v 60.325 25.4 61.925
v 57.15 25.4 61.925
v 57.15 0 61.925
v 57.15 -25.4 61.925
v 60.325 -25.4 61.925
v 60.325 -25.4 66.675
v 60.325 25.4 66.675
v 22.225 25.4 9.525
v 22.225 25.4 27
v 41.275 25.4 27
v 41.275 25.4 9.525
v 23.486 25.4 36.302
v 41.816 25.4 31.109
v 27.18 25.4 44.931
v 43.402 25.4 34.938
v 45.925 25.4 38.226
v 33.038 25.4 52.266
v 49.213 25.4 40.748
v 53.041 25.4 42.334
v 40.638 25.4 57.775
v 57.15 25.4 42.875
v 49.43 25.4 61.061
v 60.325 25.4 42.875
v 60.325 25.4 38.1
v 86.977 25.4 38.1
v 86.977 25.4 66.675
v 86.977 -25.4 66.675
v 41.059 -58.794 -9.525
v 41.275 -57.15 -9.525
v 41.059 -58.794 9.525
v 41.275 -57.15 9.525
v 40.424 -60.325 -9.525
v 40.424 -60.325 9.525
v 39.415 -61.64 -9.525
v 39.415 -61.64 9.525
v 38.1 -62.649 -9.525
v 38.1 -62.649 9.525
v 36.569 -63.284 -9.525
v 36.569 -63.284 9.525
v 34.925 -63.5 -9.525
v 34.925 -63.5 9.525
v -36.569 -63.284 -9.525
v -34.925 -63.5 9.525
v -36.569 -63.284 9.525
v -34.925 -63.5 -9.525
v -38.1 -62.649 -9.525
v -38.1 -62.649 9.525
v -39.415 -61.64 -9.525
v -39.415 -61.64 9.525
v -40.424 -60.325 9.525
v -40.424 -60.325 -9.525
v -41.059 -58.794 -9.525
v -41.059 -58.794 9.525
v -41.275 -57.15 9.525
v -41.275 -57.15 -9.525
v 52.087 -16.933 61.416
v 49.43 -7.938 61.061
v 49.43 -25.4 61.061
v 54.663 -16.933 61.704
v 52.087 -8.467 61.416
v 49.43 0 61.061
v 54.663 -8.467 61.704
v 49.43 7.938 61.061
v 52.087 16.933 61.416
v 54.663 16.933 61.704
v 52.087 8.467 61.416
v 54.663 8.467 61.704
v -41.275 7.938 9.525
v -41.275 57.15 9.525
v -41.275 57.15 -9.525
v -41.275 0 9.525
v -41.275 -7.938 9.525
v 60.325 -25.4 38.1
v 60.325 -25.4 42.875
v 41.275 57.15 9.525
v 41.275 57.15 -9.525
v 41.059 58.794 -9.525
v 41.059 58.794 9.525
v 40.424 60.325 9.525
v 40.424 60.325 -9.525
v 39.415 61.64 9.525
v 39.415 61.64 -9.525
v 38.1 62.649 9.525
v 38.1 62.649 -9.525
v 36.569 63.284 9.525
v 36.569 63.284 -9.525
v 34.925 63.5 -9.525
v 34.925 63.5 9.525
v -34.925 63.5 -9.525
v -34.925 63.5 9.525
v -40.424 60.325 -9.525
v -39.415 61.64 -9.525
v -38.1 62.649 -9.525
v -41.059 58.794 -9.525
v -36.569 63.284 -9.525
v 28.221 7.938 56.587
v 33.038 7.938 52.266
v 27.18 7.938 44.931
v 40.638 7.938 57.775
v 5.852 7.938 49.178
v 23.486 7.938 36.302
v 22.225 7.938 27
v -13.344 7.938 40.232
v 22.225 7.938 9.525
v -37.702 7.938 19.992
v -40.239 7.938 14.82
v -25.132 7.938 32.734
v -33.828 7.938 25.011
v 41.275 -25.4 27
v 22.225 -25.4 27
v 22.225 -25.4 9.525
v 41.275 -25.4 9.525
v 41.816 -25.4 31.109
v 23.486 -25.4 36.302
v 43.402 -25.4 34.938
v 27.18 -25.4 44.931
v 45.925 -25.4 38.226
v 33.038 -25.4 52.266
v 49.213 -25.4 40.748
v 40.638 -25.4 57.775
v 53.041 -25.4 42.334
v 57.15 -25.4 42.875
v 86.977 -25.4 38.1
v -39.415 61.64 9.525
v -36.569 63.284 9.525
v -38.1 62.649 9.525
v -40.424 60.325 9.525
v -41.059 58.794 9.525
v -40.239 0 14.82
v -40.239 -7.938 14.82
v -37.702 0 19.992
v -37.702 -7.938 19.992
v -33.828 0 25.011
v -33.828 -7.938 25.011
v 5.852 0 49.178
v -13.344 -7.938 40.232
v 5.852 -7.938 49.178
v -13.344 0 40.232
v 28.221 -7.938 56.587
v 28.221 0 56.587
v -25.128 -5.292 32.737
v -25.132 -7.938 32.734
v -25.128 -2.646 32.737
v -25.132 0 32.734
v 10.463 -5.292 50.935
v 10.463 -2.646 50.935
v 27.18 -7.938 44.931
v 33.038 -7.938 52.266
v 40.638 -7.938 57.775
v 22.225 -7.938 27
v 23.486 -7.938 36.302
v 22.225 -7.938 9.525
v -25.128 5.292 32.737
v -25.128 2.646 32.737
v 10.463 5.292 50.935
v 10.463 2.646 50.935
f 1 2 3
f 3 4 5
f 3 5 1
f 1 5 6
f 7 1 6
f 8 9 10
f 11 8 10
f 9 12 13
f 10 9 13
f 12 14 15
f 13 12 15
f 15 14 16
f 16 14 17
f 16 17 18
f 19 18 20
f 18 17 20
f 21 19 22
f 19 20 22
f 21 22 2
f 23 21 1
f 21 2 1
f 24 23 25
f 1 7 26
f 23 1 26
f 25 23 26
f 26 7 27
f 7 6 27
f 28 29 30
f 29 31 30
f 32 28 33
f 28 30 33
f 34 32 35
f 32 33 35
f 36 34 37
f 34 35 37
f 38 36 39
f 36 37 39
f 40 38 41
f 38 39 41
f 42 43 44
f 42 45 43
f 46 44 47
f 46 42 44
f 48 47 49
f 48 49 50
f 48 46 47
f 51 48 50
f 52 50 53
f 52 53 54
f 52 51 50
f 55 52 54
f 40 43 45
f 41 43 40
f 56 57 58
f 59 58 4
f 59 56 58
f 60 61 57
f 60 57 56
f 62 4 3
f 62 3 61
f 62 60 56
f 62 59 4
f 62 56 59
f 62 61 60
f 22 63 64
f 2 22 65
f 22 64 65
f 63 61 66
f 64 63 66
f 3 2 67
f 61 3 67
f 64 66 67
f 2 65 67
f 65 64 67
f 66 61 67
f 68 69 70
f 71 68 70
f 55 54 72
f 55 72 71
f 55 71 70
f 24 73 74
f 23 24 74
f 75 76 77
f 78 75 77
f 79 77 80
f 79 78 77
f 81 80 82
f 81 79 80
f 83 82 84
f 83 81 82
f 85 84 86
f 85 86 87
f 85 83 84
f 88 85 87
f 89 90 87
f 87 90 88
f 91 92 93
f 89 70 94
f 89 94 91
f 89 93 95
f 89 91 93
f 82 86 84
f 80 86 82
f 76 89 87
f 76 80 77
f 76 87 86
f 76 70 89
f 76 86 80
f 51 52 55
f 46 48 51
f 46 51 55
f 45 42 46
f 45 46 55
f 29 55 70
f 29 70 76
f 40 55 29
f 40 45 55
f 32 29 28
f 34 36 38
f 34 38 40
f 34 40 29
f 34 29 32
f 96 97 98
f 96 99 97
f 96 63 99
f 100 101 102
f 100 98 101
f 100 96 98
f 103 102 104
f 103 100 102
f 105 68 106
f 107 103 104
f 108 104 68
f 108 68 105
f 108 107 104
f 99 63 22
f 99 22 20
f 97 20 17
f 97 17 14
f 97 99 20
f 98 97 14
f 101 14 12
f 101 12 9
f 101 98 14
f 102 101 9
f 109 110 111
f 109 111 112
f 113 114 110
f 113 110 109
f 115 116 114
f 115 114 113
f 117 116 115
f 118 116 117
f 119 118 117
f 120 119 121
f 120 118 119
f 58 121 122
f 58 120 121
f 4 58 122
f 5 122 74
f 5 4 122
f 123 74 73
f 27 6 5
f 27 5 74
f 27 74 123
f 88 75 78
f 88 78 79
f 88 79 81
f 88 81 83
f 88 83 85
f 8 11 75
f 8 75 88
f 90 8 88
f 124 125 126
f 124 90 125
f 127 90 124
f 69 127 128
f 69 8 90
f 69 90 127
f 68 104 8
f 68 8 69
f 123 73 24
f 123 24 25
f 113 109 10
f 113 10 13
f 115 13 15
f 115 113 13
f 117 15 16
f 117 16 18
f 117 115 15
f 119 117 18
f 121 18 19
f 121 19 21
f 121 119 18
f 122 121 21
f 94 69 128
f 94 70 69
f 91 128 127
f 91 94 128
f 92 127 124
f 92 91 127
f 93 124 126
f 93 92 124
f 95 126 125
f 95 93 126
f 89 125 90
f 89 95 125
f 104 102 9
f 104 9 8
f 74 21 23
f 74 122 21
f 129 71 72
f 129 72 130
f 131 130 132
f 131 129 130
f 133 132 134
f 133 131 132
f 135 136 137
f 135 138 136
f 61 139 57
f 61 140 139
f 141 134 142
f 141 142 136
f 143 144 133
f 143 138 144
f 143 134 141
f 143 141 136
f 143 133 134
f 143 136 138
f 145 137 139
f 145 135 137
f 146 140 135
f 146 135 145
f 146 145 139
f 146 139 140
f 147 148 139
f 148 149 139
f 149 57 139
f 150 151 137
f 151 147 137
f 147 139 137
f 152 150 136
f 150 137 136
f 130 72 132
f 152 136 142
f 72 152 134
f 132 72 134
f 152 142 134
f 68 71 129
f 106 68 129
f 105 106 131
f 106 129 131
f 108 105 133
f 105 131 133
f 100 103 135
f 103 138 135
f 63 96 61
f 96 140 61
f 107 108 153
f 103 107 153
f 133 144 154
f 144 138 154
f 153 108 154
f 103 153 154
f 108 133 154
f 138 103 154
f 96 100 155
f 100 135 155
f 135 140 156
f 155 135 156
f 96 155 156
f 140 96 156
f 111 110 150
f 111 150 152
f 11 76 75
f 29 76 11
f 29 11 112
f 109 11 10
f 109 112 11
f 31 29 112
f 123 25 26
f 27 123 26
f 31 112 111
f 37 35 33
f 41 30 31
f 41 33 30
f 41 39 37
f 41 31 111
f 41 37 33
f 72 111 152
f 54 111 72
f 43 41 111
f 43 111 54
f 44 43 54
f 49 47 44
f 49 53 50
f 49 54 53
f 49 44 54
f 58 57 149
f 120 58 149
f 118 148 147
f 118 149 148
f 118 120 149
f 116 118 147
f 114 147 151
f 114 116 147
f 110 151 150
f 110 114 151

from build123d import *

# Parameters (mm, degrees)
F1_DEPTH = 63.5
F2_DEPTH = 25.4
F3_DEPTH = 7.9375
F0_W     = 26.651772843
F0_H     = 19.05
F4_DEPTH = 25.4
F0_H_2   = 4.7498
F5_DEPTH = 25.4
F0_H_3   = 4.7752
F6_DEPTH = 25.4
F7_R     = 6.35


with BuildPart() as f1:
    # F0 (on Front) → F1 (new body, symmetric)
    with BuildSketch(Plane.XZ):
        Polygon((22.225, 9.525), (-41.275, 9.525), (-41.275, -9.525), (41.275, -9.525), (41.275, 9.525), align=None)
    extrude(amount=F1_DEPTH, both=True)

    # F0 (on Front) → F2 (join, symmetric)
    with BuildSketch(Plane.XZ):
        with BuildLine():
            Line((22.225, 27.0002), (22.225, 9.525))
            Line((22.225, 9.525), (41.275, 9.525))
            Line((41.275, 9.525), (41.275, 27.0002))
            ThreePointArc((41.275, 27.0002), (45.9246798487, 38.2255201513), (57.15, 42.8752))
            Line((57.15, 42.8752), (60.325, 42.8752))
            Line((60.325, 42.8752), (60.325, 61.9252))
            Line((60.325, 61.9252), (57.15, 61.9252))
            add(Edge.make_bspline(
                [(49.4302171485, 61.0613300125), (52.1251476125, 61.4486009336), (54.7091322503, 61.7385972485), (57.15, 61.9252)],
                knots=[103.5956862279, 103.5956862279, 103.5956862279, 103.5956862279, 111.5045361635, 111.5045361635, 111.5045361635, 111.5045361635], degree=3))
            ThreePointArc((49.4302171485, 61.0613300125), (29.8610916205, 48.7963259047), (22.225, 27.0002))
        make_face()
    extrude(amount=F2_DEPTH, both=True)

    # F0 (on Front) → F3 (join, symmetric)
    with BuildSketch(Plane.XZ):
        with BuildLine():
            add(Edge.make_bspline(
                [(-41.275, 9.525), (-40.2056240451, 34.2258425008), (14.1301200379, 55.9885827536), (49.4302171485, 61.0613300125)],
                knots=[0, 0, 0, 0, 103.5956862279, 103.5956862279, 103.5956862279, 103.5956862279], degree=3))
            Line((-41.275, 9.525), (22.225, 9.525))
            Line((22.225, 9.525), (22.225, 27.0002))
            ThreePointArc((22.225, 27.0002), (29.8610916205, 48.7963259047), (49.4302171485, 61.0613300125))
        make_face()
    extrude(amount=F3_DEPTH, both=True)

    # F0 (on Front) → F4 (join, symmetric)
    with BuildSketch(Plane.XZ):
        with Locations((73.6508864215, 52.4002)):
            Rectangle(F0_W, F0_H)
    extrude(amount=F4_DEPTH, both=True)

    # F0 (on Front) → F5 (join, symmetric)
    with BuildSketch(Plane.XZ):
        with Locations((73.6508864215, 64.3001)):
            Rectangle(F0_W, F0_H_2)
    extrude(amount=F5_DEPTH, both=True)

    # F0 (on Front) → F6 (join, symmetric)
    with BuildSketch(Plane.XZ):
        with Locations((73.6508864215, 40.4876)):
            Rectangle(F0_W, F0_H_3)
    extrude(amount=F6_DEPTH, both=True)

    # F7
    f7_edges = [f1.edges().sort_by_distance(p)[0] for p in [
        (-41.275, -63.5, 0),
        (41.275, -63.5, 0),
        (41.275, 63.5, 0),
        (-41.275, 63.5, 0),
    ]]
    fillet(f7_edges, radius=F7_R)


solid = f1.part
